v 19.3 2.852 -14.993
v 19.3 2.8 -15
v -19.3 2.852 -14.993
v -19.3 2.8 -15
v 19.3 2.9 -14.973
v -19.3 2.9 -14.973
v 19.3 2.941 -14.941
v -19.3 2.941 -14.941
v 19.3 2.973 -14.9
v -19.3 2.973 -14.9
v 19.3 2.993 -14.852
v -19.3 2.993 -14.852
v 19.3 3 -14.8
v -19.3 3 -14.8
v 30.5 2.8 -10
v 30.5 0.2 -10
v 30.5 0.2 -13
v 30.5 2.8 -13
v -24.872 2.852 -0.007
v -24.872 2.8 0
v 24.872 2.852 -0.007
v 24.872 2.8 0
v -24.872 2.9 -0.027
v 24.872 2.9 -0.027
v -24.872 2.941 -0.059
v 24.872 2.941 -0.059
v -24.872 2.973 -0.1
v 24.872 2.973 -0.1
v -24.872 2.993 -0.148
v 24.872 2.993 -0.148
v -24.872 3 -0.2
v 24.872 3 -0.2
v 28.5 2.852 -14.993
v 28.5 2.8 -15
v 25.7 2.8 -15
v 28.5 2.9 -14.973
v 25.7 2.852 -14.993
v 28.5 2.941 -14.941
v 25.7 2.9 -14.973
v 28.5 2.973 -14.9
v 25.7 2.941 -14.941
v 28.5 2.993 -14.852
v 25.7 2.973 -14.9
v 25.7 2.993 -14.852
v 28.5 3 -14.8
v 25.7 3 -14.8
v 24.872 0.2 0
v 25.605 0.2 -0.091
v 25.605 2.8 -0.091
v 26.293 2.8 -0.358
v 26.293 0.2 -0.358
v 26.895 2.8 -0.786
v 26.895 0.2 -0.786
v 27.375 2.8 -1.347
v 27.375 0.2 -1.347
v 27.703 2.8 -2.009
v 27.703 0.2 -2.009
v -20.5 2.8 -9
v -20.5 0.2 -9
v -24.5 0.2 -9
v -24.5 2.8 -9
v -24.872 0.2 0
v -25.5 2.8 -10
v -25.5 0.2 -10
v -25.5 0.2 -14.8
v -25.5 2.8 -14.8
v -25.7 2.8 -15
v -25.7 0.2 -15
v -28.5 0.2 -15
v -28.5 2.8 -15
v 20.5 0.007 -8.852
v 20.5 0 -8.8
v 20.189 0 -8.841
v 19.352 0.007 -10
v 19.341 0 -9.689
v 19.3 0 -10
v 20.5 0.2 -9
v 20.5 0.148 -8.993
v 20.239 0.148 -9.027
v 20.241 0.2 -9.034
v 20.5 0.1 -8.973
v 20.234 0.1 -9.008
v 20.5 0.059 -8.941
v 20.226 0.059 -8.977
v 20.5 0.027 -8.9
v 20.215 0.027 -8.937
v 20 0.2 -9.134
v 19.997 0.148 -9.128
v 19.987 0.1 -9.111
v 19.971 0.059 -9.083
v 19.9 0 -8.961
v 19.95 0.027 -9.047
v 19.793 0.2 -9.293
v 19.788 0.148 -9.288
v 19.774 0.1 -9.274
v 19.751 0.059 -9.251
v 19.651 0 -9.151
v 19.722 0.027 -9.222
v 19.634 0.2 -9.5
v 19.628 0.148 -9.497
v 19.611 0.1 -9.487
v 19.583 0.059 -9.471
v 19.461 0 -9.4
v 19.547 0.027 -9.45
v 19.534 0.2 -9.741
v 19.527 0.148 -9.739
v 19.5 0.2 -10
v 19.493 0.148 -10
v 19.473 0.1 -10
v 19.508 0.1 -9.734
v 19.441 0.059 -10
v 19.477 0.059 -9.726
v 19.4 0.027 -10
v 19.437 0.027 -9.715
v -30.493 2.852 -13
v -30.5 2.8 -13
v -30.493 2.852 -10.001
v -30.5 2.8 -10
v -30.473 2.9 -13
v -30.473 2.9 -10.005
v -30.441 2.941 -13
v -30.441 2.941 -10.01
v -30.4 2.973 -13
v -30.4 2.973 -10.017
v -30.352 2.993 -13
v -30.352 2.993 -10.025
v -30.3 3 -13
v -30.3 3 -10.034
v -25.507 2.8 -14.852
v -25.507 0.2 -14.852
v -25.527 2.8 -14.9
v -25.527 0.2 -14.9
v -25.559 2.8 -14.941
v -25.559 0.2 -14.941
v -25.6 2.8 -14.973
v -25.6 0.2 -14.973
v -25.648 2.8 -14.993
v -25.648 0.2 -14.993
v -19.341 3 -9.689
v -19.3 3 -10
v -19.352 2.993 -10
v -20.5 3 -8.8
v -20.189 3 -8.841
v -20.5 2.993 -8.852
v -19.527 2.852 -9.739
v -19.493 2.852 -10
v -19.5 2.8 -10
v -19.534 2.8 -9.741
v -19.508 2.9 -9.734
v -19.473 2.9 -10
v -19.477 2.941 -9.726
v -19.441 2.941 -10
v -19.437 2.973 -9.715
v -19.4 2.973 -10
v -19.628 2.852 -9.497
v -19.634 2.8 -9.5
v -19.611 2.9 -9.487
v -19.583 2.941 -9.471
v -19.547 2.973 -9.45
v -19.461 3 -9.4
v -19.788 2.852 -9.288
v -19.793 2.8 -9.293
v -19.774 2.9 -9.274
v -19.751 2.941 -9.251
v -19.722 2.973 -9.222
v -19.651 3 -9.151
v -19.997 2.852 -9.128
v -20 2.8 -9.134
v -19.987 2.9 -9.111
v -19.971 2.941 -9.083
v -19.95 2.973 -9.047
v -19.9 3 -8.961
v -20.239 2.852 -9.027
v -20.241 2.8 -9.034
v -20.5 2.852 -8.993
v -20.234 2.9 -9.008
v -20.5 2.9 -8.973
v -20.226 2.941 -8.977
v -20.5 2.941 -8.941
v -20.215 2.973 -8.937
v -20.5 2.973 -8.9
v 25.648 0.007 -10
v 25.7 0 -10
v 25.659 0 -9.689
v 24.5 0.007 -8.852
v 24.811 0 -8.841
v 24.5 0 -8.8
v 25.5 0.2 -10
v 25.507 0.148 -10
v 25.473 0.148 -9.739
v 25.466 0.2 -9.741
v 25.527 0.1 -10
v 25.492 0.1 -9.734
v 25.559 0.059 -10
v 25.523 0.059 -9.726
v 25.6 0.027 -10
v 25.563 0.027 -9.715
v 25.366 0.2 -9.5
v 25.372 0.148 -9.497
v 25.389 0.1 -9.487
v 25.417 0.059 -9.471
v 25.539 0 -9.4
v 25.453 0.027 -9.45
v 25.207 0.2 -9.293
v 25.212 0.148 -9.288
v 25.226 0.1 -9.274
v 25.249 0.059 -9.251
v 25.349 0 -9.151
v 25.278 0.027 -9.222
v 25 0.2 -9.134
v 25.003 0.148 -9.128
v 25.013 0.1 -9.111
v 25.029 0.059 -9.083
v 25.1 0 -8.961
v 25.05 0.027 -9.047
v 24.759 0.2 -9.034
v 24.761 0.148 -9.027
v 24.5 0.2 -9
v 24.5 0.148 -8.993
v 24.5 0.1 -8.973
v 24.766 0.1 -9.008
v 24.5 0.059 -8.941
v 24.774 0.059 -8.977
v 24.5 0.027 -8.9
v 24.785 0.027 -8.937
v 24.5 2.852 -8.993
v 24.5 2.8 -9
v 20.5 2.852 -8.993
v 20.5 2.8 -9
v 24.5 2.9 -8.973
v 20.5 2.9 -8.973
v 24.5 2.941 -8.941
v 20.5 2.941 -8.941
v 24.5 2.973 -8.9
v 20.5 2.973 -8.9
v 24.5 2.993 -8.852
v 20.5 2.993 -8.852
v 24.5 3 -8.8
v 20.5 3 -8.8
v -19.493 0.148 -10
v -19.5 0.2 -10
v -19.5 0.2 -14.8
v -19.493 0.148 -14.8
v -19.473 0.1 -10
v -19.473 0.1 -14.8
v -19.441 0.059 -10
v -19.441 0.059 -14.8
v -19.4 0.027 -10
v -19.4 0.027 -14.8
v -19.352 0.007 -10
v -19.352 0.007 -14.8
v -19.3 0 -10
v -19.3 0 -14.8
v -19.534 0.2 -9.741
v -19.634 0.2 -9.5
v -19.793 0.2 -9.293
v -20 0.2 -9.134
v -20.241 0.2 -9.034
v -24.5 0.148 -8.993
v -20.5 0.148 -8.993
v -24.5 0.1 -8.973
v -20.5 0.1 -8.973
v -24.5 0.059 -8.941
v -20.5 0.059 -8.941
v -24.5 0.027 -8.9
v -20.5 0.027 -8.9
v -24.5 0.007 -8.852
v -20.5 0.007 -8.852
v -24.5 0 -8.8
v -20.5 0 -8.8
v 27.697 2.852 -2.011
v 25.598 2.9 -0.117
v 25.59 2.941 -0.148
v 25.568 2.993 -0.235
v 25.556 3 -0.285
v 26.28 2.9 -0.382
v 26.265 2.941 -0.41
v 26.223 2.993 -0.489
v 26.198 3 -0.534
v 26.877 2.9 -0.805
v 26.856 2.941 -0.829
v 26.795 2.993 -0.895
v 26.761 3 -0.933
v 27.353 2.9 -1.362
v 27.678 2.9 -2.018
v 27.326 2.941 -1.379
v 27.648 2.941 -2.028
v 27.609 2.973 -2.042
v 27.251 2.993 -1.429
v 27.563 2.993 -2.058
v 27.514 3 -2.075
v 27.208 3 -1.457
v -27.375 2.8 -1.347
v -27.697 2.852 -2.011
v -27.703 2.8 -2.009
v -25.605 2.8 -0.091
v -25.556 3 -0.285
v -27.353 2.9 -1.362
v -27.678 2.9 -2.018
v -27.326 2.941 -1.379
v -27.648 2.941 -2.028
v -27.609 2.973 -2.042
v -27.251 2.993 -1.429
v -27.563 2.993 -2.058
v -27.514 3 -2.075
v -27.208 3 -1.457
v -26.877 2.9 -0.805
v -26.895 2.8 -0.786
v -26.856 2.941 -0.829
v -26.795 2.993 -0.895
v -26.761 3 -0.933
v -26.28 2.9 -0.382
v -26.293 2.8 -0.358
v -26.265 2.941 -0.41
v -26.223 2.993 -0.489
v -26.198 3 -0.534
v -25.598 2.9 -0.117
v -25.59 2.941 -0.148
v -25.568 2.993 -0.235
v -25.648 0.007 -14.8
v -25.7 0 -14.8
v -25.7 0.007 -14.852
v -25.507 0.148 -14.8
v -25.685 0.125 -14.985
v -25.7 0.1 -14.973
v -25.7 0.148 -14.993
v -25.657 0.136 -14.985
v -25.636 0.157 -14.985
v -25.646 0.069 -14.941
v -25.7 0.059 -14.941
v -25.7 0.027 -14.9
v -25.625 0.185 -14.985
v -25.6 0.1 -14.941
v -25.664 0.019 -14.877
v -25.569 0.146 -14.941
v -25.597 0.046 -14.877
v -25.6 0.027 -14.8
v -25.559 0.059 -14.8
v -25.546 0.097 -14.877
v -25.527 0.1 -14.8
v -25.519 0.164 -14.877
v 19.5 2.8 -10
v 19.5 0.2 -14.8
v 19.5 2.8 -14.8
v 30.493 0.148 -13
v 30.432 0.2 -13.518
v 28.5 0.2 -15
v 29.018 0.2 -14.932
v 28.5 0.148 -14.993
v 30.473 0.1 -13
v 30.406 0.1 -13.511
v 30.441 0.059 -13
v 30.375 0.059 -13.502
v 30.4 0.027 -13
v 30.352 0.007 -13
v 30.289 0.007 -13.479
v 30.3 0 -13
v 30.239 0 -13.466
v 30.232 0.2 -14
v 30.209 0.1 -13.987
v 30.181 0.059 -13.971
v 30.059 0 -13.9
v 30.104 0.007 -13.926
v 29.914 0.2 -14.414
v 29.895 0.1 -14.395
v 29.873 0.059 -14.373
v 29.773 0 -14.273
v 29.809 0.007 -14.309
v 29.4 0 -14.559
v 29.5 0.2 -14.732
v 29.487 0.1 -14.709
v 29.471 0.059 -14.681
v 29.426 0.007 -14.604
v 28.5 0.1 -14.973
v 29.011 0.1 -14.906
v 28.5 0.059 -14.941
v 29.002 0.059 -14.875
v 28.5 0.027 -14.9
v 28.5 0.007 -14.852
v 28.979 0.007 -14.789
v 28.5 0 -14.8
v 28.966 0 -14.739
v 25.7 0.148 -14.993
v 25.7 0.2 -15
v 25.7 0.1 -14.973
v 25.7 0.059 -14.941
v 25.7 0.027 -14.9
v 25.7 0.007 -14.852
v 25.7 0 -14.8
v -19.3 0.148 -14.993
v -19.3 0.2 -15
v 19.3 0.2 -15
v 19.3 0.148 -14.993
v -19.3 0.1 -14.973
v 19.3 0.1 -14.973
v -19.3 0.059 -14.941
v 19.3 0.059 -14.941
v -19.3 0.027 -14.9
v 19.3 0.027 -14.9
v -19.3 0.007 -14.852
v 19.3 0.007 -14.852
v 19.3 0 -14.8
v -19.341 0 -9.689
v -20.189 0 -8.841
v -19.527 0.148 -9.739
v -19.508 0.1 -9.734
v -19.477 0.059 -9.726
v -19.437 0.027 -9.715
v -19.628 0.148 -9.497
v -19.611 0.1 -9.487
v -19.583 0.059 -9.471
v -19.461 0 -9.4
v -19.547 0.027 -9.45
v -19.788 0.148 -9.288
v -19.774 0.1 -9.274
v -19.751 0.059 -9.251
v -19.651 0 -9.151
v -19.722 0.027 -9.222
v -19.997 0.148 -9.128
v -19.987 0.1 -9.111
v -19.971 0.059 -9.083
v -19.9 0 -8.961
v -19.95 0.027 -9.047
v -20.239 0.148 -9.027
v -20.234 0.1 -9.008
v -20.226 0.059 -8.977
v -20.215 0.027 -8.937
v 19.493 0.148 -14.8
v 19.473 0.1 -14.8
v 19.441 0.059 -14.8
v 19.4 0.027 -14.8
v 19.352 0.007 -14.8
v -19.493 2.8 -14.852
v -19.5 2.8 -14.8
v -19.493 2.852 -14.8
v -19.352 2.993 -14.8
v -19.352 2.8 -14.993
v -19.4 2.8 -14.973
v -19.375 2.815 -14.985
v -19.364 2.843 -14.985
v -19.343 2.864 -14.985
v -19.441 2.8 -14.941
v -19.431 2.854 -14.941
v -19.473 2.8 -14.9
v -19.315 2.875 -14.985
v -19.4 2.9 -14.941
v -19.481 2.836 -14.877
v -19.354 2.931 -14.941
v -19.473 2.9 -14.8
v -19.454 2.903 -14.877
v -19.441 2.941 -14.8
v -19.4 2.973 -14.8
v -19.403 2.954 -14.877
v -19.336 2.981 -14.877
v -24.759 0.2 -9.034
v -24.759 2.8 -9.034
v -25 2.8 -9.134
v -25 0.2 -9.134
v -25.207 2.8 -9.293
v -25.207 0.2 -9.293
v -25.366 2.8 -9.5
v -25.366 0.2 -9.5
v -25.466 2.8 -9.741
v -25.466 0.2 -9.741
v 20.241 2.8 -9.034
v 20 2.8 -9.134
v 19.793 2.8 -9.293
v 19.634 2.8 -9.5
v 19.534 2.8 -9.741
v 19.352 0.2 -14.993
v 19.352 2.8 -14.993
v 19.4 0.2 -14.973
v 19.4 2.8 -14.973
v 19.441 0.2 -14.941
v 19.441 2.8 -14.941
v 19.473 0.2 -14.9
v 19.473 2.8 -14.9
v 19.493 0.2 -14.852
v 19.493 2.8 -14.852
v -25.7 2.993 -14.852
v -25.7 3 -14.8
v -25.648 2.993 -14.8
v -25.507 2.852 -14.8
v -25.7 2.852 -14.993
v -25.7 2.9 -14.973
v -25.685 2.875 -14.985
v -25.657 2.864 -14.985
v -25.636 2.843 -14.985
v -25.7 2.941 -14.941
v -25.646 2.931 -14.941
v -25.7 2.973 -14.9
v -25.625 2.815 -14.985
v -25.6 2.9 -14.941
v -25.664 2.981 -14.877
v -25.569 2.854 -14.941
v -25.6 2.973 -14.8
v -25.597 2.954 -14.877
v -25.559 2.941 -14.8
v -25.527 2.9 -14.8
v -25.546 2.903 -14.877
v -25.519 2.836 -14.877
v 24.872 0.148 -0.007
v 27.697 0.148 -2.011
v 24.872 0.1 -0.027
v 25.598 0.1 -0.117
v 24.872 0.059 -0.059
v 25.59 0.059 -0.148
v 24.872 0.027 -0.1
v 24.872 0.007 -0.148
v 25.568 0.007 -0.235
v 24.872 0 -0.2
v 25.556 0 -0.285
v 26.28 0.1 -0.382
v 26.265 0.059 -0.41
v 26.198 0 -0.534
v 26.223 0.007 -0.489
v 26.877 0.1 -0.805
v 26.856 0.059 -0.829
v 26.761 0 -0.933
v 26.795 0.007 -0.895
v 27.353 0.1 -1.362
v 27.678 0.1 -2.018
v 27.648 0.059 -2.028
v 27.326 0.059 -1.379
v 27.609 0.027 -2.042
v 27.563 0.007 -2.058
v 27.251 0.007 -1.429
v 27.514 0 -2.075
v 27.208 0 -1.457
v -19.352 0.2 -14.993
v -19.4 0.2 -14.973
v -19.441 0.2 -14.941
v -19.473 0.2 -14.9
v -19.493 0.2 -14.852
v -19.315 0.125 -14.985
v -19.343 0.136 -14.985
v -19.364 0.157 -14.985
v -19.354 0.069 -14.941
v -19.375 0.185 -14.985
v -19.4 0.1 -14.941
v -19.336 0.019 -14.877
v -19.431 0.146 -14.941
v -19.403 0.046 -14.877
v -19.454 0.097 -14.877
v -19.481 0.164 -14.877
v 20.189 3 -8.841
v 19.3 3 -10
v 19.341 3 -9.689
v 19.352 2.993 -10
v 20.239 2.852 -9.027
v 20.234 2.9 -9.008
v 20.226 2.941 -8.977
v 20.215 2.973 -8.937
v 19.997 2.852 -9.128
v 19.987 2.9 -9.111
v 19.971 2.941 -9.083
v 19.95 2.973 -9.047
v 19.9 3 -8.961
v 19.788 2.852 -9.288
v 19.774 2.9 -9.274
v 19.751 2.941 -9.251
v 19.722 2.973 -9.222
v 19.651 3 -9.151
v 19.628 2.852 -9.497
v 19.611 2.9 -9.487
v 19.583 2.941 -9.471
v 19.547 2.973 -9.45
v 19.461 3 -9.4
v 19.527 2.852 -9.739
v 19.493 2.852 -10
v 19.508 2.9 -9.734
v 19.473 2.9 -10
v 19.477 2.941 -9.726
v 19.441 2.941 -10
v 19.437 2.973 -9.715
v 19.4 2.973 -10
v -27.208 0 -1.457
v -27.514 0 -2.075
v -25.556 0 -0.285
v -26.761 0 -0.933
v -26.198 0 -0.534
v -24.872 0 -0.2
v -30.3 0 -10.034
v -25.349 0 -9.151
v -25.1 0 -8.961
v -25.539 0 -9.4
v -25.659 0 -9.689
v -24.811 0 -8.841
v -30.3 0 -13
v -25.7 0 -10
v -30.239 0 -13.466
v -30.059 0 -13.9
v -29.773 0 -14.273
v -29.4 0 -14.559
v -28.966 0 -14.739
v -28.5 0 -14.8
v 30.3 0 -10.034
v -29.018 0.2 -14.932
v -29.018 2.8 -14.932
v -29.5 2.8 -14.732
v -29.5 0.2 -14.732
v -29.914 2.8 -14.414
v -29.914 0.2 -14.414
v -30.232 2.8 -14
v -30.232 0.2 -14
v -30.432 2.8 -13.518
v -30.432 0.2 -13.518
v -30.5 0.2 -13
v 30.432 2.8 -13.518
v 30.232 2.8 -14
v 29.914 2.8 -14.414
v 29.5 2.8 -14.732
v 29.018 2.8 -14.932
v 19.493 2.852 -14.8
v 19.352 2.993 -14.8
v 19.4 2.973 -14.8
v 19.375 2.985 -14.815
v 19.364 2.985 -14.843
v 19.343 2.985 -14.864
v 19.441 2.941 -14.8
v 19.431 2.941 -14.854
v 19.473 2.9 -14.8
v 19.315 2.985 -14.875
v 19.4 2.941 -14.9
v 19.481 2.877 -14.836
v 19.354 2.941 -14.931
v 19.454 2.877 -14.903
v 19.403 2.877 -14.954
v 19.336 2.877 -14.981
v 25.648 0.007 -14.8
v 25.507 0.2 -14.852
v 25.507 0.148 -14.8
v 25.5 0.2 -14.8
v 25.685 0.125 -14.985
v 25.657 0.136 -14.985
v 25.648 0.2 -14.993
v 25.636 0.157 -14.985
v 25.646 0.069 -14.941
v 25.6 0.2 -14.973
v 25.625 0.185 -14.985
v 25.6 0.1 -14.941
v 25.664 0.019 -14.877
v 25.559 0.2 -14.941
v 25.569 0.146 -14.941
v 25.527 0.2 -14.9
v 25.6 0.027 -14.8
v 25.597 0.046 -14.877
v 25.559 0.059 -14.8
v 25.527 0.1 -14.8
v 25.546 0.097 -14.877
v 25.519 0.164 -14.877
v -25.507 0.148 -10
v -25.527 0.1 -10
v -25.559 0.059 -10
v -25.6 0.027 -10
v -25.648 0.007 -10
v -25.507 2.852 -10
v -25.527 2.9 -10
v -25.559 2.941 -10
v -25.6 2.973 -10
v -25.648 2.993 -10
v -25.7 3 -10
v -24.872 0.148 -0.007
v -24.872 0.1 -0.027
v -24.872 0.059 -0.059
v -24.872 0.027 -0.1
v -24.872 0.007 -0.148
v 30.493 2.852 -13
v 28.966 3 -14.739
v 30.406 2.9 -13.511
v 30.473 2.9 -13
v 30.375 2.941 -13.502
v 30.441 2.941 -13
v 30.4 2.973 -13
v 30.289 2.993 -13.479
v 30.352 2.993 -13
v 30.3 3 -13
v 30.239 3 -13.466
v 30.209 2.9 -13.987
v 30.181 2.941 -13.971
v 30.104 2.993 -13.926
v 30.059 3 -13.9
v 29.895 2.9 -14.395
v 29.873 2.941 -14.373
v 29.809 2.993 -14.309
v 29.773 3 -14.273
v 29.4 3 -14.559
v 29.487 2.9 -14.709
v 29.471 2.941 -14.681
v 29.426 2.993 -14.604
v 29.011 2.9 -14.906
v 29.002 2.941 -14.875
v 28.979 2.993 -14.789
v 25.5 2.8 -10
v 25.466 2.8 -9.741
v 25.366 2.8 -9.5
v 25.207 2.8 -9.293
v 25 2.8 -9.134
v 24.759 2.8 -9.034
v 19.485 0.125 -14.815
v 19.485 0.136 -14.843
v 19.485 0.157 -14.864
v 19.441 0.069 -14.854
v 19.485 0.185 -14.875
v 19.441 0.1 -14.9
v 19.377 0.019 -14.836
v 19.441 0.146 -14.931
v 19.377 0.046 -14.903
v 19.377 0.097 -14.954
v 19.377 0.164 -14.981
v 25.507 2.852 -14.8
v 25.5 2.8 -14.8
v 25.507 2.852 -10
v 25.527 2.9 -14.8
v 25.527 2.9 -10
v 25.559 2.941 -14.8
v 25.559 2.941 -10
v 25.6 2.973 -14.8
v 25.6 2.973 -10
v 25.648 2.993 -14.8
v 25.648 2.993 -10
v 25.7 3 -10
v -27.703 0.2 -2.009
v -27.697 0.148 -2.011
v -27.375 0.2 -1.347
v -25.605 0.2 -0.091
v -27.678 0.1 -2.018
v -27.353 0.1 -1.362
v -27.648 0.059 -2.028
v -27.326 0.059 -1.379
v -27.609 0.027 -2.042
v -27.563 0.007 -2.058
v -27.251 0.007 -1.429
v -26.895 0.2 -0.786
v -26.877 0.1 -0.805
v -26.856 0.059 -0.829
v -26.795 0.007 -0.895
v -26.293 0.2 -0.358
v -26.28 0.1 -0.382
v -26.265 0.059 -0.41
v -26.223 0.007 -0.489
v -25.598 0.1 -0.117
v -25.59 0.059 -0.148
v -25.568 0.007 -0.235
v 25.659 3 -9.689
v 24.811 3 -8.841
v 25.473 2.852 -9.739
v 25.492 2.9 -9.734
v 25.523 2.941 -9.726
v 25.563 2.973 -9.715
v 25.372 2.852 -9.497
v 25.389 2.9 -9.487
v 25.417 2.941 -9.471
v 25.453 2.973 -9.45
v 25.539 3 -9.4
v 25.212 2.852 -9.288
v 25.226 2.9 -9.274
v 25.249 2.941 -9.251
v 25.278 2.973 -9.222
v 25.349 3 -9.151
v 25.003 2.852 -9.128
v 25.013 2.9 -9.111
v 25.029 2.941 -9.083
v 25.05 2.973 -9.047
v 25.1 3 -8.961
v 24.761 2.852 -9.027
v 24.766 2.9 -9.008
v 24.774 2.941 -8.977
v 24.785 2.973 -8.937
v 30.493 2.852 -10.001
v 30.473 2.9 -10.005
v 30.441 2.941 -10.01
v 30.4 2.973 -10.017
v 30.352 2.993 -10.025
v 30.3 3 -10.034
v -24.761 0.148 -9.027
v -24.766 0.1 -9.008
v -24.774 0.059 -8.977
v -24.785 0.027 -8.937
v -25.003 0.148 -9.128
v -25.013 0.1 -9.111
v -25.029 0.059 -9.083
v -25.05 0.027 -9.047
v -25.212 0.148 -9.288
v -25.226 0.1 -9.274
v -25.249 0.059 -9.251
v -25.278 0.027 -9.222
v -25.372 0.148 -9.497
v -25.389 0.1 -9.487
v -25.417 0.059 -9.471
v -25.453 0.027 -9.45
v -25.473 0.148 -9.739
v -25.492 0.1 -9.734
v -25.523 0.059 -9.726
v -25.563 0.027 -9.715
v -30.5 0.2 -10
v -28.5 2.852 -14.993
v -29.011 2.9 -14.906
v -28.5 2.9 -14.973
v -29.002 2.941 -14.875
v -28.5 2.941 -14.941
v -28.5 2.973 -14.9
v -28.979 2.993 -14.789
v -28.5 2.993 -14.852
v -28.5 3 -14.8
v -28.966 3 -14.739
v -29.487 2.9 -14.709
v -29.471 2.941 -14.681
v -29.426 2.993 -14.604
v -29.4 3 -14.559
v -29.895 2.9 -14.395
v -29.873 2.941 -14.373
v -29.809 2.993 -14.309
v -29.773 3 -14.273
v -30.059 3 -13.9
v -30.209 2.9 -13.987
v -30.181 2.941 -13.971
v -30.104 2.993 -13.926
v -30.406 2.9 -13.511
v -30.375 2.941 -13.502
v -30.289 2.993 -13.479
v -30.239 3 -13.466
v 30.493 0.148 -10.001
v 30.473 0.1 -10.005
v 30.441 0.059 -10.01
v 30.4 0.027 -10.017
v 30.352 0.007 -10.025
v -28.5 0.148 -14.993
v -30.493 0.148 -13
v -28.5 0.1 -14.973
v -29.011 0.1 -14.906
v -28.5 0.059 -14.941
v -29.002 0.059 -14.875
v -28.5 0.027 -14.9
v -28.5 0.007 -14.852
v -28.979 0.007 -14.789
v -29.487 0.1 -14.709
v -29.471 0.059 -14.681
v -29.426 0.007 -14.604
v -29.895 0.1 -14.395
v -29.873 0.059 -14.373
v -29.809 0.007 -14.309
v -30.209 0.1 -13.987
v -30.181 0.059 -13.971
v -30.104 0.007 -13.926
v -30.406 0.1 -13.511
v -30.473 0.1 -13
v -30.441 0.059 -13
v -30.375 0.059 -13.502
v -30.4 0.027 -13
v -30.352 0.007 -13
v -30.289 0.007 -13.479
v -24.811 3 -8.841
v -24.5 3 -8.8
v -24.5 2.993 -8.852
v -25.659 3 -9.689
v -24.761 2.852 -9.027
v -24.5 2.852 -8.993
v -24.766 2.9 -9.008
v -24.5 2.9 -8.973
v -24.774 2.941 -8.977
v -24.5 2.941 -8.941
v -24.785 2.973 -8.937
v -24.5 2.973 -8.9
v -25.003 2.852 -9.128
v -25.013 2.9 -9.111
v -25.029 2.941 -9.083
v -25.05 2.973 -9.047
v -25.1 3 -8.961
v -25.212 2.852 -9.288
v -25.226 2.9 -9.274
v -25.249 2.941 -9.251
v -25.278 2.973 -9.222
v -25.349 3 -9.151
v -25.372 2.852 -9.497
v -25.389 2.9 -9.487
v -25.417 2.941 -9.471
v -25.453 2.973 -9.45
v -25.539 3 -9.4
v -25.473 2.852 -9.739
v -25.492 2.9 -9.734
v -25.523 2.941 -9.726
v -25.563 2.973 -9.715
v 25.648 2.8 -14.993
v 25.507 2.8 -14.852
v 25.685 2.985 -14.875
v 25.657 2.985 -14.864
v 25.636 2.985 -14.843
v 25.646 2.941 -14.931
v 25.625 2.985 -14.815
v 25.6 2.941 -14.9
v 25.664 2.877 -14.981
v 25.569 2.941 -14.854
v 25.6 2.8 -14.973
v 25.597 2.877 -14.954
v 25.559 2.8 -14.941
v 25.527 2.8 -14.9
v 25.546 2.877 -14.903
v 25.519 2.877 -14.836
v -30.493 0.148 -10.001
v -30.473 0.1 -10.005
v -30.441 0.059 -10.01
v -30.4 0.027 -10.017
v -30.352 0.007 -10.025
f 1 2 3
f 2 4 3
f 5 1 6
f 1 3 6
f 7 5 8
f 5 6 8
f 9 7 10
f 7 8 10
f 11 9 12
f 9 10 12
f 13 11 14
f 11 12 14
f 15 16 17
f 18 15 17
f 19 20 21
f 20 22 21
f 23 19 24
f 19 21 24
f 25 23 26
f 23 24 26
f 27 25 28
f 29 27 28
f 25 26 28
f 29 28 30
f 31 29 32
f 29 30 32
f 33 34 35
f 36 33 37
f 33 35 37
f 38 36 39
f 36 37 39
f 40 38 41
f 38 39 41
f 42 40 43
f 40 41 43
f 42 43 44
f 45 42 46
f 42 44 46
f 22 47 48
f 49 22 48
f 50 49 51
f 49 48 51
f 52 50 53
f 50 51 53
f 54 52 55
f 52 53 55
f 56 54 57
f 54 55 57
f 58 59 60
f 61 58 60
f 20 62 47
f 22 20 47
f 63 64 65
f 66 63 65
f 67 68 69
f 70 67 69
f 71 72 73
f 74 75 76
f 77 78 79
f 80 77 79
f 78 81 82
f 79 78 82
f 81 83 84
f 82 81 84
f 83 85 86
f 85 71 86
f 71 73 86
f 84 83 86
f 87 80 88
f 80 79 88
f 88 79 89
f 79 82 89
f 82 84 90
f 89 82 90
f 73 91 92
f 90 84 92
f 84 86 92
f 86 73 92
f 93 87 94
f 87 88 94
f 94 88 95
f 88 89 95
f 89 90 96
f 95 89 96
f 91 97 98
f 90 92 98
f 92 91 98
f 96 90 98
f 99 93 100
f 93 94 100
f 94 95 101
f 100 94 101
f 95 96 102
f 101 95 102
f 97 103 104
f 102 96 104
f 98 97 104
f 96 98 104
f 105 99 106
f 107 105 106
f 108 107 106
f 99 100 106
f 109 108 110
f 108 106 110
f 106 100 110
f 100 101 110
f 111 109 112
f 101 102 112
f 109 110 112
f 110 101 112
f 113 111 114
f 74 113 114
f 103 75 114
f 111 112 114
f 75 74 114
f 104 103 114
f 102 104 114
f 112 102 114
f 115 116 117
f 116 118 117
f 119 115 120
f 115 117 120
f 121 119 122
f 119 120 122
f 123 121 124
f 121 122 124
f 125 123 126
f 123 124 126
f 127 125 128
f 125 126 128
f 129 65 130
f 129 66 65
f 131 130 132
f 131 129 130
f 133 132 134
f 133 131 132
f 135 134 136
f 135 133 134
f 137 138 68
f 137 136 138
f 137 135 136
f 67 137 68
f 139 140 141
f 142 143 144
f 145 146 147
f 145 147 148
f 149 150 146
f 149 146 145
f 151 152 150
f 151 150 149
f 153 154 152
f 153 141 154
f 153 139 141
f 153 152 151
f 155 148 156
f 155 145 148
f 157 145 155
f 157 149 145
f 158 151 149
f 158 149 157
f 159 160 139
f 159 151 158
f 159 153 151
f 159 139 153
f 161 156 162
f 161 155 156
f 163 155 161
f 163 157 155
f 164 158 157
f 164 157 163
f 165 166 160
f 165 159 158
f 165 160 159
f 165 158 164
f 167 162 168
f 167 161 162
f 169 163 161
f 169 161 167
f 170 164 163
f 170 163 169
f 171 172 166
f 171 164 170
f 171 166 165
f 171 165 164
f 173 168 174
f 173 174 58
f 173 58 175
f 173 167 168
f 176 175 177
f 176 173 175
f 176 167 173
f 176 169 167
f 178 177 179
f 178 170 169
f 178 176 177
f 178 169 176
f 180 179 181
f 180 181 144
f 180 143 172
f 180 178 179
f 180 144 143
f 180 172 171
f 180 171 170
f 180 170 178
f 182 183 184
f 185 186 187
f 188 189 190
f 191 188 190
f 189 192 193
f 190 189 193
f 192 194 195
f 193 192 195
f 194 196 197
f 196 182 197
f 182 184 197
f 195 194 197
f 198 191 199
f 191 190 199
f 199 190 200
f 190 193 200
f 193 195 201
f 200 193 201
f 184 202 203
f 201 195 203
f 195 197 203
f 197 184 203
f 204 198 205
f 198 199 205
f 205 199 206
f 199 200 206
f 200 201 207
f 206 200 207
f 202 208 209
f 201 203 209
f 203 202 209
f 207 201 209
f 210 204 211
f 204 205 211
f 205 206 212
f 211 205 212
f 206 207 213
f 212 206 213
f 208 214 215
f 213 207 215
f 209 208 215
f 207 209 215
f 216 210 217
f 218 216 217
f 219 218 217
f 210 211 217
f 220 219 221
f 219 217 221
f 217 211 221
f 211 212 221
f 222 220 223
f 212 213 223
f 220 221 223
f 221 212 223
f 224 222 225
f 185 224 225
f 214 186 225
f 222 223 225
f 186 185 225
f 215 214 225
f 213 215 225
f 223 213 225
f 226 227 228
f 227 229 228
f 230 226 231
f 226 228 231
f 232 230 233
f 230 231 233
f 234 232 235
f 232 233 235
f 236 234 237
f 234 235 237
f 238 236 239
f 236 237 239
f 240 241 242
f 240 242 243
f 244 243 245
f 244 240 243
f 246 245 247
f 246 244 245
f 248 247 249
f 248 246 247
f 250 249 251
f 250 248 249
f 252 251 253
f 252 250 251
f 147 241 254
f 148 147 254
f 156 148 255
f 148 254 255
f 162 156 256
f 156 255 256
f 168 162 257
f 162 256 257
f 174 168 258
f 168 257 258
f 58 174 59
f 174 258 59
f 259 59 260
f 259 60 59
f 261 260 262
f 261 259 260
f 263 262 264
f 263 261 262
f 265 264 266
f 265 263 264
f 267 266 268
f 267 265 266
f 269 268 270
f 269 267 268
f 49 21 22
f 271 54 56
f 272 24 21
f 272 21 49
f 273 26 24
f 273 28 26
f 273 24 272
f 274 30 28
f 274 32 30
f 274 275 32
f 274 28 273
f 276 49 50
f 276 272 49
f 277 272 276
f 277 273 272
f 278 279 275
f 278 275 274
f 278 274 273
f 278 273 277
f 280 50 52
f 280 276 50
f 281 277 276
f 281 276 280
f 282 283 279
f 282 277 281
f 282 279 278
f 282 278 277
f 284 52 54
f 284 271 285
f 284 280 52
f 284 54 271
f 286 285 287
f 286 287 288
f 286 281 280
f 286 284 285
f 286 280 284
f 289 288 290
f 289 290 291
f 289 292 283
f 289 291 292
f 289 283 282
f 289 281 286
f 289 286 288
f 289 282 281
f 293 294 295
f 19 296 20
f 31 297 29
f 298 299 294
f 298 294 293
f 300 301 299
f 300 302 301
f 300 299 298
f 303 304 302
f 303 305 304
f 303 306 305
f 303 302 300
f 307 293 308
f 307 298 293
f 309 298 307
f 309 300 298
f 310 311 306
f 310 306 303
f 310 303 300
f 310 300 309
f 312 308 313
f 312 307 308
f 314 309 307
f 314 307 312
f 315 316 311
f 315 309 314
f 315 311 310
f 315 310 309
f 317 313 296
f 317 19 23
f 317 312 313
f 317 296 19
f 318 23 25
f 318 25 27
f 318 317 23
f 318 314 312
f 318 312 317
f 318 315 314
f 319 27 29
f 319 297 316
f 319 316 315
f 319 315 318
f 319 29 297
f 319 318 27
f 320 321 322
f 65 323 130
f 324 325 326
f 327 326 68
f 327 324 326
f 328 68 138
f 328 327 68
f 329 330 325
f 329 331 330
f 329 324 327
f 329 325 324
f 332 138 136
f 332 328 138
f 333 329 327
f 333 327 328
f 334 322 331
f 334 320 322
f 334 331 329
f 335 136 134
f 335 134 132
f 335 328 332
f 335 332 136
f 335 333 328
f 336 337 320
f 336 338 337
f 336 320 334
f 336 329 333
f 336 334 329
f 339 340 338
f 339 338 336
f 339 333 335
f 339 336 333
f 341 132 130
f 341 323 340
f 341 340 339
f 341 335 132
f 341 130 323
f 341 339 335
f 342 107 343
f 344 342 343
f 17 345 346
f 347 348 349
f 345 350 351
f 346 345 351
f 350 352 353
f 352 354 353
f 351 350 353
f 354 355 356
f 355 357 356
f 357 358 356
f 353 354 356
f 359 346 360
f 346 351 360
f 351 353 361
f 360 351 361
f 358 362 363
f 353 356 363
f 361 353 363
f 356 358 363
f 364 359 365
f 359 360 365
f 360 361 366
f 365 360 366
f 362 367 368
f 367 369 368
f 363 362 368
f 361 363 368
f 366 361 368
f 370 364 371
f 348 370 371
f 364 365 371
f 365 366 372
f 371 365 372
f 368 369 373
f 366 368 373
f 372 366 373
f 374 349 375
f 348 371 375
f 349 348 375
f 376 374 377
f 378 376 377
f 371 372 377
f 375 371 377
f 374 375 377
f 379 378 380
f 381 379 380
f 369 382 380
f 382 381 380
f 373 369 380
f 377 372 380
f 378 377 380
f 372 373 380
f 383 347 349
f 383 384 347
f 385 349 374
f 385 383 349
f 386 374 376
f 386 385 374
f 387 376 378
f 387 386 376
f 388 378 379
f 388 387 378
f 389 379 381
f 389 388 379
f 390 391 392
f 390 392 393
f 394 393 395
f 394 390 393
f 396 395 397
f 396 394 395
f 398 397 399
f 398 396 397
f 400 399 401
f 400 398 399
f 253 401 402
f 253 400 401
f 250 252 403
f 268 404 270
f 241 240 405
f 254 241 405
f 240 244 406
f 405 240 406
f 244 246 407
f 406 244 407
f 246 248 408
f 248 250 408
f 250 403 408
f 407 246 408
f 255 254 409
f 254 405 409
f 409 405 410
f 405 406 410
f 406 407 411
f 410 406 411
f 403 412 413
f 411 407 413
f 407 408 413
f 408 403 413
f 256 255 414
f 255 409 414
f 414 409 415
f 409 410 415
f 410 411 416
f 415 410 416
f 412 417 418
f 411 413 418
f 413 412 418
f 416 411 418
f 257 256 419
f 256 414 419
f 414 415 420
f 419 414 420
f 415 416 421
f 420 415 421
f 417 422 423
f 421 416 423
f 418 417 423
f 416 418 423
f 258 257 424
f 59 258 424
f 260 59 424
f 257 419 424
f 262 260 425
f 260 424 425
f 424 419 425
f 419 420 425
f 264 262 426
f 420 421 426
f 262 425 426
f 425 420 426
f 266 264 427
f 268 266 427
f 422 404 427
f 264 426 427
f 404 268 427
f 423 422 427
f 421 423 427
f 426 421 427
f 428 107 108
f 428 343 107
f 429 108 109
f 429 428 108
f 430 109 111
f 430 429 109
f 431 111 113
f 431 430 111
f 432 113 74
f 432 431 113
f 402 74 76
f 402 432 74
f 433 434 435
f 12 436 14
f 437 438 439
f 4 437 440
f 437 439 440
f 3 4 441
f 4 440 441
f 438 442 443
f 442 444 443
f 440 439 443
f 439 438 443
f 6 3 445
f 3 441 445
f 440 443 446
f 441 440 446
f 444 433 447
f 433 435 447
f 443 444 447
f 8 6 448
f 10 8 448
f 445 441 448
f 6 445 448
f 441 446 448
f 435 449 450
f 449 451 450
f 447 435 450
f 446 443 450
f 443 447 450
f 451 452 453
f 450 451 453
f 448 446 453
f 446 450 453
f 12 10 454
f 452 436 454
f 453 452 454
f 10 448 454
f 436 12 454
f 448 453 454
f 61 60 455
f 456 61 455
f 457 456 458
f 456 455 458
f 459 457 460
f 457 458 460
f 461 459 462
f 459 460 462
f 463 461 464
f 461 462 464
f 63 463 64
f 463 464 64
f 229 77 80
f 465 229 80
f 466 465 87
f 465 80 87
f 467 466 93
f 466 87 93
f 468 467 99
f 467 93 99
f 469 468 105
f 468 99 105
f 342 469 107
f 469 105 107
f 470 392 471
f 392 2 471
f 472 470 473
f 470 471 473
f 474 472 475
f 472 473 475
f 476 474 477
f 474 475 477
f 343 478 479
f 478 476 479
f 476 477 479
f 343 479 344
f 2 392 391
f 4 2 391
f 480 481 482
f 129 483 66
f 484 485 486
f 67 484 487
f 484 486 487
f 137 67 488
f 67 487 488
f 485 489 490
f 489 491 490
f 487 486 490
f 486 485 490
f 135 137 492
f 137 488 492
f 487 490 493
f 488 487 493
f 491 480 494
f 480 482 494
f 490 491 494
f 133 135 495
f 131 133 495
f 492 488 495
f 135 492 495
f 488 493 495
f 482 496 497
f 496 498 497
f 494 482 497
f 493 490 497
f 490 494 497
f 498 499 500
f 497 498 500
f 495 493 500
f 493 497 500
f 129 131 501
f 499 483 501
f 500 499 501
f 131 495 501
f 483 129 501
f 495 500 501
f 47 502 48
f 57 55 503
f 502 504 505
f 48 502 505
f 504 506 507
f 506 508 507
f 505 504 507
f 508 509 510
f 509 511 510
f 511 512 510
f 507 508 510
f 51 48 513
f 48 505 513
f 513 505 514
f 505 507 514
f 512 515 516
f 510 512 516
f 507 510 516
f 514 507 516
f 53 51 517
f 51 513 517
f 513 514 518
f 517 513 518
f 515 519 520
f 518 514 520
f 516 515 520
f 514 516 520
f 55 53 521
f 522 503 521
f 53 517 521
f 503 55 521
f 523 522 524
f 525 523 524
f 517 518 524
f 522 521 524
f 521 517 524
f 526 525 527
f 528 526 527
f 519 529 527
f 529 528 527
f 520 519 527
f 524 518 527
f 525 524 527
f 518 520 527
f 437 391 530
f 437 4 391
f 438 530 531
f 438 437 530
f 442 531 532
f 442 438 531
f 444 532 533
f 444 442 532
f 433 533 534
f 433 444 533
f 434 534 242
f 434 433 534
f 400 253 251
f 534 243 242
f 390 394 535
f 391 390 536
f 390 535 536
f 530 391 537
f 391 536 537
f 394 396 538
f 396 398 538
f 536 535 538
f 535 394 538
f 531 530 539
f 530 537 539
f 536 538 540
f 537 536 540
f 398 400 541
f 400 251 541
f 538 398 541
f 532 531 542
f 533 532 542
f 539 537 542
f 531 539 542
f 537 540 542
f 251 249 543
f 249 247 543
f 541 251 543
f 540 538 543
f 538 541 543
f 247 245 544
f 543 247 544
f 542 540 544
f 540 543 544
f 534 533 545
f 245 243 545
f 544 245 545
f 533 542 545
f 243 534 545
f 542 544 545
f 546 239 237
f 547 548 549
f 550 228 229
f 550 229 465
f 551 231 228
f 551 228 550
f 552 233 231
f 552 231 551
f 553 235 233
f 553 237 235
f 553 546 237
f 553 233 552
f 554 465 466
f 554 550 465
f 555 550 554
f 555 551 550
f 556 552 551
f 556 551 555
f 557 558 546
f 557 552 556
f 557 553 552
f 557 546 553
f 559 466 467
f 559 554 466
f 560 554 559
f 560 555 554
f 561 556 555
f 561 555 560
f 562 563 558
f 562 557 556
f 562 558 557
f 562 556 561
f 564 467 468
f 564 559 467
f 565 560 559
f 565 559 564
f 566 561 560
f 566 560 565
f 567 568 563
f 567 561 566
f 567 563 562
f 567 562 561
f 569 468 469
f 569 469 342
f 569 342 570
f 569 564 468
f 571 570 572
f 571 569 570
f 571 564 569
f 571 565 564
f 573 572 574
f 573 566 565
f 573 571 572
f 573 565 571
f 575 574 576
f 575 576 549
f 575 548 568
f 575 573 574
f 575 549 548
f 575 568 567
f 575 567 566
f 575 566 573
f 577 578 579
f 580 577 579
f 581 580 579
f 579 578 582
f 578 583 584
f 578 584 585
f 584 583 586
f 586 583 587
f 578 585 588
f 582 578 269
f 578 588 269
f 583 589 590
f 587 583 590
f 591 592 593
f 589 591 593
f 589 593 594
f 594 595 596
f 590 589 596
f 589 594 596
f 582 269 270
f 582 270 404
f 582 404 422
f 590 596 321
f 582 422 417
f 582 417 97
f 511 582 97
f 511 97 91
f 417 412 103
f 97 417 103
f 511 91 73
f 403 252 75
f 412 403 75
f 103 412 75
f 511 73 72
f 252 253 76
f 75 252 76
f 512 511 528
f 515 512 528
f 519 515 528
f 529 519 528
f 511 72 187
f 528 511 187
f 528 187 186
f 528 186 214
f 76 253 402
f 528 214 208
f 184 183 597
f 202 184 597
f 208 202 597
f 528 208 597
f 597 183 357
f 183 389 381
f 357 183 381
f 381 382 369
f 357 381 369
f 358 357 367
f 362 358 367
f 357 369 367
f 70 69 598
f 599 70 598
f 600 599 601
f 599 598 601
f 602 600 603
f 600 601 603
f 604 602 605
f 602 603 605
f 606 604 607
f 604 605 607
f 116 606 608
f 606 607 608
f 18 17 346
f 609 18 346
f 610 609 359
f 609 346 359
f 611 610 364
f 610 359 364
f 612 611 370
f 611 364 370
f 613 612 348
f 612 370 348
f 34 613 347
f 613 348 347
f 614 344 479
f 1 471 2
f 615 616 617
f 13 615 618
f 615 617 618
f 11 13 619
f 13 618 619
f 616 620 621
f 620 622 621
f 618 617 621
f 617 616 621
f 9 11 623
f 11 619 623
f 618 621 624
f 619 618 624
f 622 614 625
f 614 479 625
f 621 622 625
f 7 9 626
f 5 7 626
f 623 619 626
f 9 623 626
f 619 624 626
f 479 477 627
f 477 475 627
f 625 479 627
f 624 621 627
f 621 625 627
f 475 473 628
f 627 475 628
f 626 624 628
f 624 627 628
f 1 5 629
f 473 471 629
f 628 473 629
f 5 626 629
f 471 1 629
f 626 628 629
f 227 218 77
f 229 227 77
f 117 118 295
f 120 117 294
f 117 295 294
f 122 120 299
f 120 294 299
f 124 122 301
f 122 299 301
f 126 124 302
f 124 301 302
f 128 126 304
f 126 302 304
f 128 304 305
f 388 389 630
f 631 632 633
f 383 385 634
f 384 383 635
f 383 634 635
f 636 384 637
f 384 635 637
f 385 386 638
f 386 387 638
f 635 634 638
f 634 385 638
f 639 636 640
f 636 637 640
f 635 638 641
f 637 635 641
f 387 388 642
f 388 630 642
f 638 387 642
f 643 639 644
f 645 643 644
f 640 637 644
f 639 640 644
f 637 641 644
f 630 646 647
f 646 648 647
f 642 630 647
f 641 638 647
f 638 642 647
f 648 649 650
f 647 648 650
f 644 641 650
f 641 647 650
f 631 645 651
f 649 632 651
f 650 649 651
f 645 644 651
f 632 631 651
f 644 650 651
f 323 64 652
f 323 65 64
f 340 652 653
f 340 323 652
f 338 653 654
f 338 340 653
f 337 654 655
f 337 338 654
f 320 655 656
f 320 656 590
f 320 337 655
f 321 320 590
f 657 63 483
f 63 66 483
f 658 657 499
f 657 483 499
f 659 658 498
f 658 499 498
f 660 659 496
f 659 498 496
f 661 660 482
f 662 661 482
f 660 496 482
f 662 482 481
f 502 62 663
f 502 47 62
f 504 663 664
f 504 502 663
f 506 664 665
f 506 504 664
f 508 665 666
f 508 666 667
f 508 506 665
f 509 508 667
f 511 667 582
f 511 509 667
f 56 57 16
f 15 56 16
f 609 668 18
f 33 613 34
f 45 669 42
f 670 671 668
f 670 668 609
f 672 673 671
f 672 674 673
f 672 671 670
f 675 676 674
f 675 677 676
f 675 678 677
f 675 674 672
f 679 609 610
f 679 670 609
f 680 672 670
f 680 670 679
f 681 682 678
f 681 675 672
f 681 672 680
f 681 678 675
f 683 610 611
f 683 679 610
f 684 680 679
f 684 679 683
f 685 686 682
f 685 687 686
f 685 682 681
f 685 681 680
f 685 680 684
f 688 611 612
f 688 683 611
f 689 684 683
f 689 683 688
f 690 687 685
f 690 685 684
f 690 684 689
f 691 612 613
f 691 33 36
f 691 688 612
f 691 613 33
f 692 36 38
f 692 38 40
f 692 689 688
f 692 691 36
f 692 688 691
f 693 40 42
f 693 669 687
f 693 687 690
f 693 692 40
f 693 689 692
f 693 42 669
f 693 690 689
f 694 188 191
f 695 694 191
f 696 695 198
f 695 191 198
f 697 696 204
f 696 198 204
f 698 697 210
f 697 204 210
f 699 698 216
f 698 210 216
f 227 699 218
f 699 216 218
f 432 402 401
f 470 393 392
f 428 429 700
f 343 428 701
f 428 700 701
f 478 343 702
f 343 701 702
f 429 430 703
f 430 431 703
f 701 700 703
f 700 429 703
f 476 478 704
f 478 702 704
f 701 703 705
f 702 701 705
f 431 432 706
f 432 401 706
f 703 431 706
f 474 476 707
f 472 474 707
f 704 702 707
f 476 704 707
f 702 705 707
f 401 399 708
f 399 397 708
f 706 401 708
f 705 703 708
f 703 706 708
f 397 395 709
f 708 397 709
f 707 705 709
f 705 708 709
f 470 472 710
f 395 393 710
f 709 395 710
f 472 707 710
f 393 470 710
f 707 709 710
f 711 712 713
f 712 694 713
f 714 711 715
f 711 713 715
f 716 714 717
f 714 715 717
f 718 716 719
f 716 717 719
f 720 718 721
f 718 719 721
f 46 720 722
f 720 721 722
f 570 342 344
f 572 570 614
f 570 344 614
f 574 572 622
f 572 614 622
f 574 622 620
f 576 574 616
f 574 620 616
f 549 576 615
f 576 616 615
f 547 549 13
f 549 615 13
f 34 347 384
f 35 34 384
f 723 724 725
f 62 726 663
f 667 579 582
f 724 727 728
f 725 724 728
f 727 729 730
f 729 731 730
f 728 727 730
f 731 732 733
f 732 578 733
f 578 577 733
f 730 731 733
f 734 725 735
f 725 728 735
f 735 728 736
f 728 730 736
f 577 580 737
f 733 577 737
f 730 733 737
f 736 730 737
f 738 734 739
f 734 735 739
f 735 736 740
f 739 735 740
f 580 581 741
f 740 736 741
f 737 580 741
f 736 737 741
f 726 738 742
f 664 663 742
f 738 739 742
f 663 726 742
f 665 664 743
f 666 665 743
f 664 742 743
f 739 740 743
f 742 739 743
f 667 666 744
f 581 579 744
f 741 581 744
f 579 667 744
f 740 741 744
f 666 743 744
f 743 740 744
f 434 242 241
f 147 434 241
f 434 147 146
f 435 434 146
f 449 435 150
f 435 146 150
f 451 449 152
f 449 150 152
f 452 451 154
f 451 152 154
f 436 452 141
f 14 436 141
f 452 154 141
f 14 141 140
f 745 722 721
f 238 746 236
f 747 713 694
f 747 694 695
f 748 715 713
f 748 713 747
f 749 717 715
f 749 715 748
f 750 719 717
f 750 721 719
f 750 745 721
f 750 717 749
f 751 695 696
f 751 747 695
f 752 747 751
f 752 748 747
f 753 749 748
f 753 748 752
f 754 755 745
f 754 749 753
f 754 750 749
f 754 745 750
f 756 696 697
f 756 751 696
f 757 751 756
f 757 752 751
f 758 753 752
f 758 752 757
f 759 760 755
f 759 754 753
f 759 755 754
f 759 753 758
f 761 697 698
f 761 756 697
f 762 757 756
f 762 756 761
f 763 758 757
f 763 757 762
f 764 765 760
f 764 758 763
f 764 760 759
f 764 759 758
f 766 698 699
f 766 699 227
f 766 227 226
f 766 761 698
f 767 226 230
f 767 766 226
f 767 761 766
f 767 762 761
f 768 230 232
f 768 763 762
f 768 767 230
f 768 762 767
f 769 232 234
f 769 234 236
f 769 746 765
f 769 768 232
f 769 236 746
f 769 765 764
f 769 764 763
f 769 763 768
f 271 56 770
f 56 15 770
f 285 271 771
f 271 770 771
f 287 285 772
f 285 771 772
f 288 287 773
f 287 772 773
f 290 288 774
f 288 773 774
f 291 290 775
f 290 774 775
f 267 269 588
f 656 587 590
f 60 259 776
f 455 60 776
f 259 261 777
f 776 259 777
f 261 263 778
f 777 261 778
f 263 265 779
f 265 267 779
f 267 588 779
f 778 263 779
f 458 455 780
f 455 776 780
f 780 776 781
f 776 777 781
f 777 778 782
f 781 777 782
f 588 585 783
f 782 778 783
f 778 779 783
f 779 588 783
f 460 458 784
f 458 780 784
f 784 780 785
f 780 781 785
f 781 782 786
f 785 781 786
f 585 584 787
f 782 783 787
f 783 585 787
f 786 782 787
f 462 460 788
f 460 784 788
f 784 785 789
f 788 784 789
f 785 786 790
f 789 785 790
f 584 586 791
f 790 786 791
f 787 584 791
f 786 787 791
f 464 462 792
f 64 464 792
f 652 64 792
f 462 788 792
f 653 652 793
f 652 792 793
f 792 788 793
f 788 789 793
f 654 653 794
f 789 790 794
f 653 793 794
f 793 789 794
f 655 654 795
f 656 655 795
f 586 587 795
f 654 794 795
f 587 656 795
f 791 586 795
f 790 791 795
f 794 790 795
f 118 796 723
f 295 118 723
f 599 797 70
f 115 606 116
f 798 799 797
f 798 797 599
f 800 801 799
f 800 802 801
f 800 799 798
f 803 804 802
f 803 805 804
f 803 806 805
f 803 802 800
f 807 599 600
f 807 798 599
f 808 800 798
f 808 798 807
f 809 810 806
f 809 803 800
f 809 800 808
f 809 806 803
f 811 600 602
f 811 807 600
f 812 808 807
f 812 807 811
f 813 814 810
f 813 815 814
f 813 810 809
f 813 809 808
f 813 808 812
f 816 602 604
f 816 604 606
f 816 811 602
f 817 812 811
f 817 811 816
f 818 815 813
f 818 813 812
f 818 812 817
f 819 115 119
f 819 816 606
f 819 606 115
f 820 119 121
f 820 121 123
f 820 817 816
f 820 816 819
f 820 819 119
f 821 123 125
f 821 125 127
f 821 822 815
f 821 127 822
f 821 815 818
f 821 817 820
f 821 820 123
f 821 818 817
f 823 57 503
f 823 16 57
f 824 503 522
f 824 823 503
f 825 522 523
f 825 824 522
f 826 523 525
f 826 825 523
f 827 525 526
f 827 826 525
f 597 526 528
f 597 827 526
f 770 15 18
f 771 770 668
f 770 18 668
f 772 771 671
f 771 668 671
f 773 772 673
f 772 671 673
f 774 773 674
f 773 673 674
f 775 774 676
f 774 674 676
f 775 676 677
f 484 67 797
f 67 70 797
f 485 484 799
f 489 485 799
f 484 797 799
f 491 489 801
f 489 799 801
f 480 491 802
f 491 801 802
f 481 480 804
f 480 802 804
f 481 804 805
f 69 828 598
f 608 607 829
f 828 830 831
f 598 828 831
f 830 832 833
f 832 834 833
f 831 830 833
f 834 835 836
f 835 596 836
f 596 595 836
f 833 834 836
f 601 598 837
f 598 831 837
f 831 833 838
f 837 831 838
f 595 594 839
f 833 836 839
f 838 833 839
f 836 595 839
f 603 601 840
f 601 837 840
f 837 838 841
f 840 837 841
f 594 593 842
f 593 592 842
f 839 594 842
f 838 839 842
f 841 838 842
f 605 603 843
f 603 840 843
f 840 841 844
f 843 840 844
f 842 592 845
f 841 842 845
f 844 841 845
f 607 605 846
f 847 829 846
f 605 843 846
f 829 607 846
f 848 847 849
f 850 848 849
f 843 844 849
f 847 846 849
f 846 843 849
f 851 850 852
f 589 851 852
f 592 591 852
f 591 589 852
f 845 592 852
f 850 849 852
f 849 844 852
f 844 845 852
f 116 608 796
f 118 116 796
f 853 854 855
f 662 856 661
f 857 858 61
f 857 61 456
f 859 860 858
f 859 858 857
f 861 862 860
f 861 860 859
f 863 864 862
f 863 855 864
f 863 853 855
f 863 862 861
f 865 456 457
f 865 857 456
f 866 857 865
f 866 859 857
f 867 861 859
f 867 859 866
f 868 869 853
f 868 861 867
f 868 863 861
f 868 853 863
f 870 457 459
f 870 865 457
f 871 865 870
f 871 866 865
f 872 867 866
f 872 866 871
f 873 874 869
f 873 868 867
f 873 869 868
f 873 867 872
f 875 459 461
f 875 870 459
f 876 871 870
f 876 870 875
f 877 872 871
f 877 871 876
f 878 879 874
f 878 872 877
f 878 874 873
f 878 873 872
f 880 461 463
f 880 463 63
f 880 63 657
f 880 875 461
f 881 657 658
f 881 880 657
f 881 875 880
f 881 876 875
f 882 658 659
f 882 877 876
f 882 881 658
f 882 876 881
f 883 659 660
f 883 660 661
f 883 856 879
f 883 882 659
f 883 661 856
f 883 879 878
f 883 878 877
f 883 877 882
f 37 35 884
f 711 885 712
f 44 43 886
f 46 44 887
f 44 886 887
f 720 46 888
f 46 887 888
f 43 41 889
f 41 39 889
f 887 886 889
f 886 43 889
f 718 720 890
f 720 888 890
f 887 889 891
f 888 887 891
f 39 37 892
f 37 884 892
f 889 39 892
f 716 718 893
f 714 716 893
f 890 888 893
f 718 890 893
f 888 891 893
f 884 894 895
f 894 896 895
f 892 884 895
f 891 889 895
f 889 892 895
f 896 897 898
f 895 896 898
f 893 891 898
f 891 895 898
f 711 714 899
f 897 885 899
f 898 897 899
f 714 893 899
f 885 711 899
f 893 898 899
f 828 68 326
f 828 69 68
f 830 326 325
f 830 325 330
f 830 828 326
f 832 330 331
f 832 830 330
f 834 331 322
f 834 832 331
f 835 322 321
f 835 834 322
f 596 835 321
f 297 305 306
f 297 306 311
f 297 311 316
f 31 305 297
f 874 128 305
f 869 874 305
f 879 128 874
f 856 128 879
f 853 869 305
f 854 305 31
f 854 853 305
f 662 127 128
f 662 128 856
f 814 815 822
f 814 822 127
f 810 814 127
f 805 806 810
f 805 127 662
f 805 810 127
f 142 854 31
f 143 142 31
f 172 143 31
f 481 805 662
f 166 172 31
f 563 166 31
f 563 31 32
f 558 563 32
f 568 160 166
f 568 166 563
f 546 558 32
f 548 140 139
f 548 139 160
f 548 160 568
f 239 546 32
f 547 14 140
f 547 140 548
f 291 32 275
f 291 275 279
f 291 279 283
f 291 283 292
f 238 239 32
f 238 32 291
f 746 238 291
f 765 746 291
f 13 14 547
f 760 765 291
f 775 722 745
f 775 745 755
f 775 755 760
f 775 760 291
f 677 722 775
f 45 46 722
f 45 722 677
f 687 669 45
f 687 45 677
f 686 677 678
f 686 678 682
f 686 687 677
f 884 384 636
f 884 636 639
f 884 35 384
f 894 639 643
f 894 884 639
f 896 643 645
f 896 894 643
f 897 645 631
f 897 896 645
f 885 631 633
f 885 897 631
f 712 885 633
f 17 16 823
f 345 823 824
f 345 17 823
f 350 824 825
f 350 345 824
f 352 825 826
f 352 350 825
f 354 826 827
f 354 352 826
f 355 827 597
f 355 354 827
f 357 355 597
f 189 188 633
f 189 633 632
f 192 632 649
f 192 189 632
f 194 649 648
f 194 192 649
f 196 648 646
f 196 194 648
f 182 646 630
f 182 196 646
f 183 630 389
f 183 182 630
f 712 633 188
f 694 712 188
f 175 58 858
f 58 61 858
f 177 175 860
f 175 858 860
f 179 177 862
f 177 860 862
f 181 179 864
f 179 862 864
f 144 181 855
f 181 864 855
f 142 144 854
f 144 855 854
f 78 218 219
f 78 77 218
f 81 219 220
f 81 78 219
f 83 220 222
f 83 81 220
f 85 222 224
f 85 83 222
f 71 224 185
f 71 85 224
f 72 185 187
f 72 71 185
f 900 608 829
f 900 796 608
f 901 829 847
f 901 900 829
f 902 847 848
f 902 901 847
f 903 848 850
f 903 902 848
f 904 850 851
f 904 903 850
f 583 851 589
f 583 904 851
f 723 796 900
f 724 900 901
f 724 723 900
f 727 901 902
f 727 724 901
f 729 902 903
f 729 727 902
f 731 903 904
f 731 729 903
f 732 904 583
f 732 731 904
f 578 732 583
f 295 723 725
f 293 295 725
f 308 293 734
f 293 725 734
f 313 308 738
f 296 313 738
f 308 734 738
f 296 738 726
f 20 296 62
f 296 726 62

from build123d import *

# Parameters (mm, degrees)
BOSS_EXTRUDE1_DEPTH = 3
FILLET1_R           = 0.2


with BuildPart() as part:
    # Sketch1 → Boss-Extrude1 (new body)
    with BuildSketch(Plane(origin=(0, 0, 0), x_dir=(1, 0, 0), z_dir=(0, 1, 0))):
        with BuildLine():
            Line((19.5, 15), (-19.5, 15))
            Line((-19.5, 15), (-19.5, 10))
            ThreePointArc((-19.5, 10), (-19.792893219, 9.292893219), (-20.5, 9))
            Line((-20.5, 9), (-24.5, 9))
            ThreePointArc((-24.5, 9), (-25.207106781, 9.292893219), (-25.5, 10))
            Line((-25.5, 10), (-25.5, 15))
            Line((-25.5, 15), (-28.5, 15))
            ThreePointArc((-28.5, 15), (-29.914213562, 14.414213562), (-30.5, 13))
            Line((-30.5, 13), (-30.5, 10))
            Line((-30.5, 10), (-27.703132054, 2.008948726))
            ThreePointArc((-27.703132054, 2.008948726), (-26.60747838, 0.553251768), (-24.871556985, 0))
            Line((-24.871556985, 0), (24.871556985, 0))
            ThreePointArc((24.871556985, 0), (26.60747838, 0.553251768), (27.703132054, 2.008948726))
            Line((27.703132054, 2.008948726), (30.5, 10))
            Line((30.5, 10), (30.5, 13))
            ThreePointArc((30.5, 13), (29.914213562, 14.414213562), (28.5, 15))
            Line((28.5, 15), (25.5, 15))
            Line((25.5, 15), (25.5, 10))
            ThreePointArc((25.5, 10), (25.207106781, 9.292893219), (24.5, 9))
            Line((24.5, 9), (20.5, 9))
            ThreePointArc((20.5, 9), (19.792893219, 9.292893219), (19.5, 10))
            Line((19.5, 10), (19.5, 15))
        make_face()
    extrude(amount=BOSS_EXTRUDE1_DEPTH)

    # Fillet1
    fillet1_edges = [part.edges().sort_by_distance(p)[0] for p in [
        (-25.207106781, 3, -9.292893219),
        (-25.5, 3, -12.5),
        (-27, 3, -15),
        (-19.5, 0, -12.5),
        (-29.914213562, 3, -14.414213562),
        (0, 0, -15),
        (19.5, 0, -12.5),
        (19.792893219, 0, -9.292893219),
        (22.5, 0, -9),
        (25.207106781, 0, -9.292893219),
        (25.5, 0, -12.5),
        (27, 0, -15),
        (-30.5, 3, -11.5),
        (29.914213562, 0, -14.414213562),
        (30.5, 0, -11.5),
        (29.101566027, 0, -6.004474363),
        (26.60747838, 0, -0.553251768),
        (0, 0, 0),
        (-26.60747838, 0, -0.553251768),
        (-29.101566027, 0, -6.004474363),
        (-30.5, 0, -11.5),
        (-29.101566027, 3, -6.004474363),
        (-29.914213562, 0, -14.414213562),
        (-27, 0, -15),
        (-25.5, 0, -12.5),
        (-25.207106781, 0, -9.292893219),
        (-22.5, 0, -9),
        (-19.792893219, 0, -9.292893219),
        (-26.60747838, 3, -0.553251768),
        (0, 3, 0),
        (26.60747838, 3, -0.553251768),
        (-19.5, 1.5, -15),
        (19.5, 1.5, -15),
        (25.5, 1.5, -15),
        (-25.5, 1.5, -15),
        (29.101566027, 3, -6.004474363),
        (-19.792893219, 3, -9.292893219),
        (30.5, 3, -11.5),
        (29.914213562, 3, -14.414213562),
        (27, 3, -15),
        (25.5, 3, -12.5),
        (25.207106781, 3, -9.292893219),
        (22.5, 3, -9),
        (19.792893219, 3, -9.292893219),
        (19.5, 3, -12.5),
        (0, 3, -15),
        (-19.5, 3, -12.5),
        (-22.5, 3, -9),
    ]]
    fillet(fillet1_edges, radius=FILLET1_R)


solid = part.part
